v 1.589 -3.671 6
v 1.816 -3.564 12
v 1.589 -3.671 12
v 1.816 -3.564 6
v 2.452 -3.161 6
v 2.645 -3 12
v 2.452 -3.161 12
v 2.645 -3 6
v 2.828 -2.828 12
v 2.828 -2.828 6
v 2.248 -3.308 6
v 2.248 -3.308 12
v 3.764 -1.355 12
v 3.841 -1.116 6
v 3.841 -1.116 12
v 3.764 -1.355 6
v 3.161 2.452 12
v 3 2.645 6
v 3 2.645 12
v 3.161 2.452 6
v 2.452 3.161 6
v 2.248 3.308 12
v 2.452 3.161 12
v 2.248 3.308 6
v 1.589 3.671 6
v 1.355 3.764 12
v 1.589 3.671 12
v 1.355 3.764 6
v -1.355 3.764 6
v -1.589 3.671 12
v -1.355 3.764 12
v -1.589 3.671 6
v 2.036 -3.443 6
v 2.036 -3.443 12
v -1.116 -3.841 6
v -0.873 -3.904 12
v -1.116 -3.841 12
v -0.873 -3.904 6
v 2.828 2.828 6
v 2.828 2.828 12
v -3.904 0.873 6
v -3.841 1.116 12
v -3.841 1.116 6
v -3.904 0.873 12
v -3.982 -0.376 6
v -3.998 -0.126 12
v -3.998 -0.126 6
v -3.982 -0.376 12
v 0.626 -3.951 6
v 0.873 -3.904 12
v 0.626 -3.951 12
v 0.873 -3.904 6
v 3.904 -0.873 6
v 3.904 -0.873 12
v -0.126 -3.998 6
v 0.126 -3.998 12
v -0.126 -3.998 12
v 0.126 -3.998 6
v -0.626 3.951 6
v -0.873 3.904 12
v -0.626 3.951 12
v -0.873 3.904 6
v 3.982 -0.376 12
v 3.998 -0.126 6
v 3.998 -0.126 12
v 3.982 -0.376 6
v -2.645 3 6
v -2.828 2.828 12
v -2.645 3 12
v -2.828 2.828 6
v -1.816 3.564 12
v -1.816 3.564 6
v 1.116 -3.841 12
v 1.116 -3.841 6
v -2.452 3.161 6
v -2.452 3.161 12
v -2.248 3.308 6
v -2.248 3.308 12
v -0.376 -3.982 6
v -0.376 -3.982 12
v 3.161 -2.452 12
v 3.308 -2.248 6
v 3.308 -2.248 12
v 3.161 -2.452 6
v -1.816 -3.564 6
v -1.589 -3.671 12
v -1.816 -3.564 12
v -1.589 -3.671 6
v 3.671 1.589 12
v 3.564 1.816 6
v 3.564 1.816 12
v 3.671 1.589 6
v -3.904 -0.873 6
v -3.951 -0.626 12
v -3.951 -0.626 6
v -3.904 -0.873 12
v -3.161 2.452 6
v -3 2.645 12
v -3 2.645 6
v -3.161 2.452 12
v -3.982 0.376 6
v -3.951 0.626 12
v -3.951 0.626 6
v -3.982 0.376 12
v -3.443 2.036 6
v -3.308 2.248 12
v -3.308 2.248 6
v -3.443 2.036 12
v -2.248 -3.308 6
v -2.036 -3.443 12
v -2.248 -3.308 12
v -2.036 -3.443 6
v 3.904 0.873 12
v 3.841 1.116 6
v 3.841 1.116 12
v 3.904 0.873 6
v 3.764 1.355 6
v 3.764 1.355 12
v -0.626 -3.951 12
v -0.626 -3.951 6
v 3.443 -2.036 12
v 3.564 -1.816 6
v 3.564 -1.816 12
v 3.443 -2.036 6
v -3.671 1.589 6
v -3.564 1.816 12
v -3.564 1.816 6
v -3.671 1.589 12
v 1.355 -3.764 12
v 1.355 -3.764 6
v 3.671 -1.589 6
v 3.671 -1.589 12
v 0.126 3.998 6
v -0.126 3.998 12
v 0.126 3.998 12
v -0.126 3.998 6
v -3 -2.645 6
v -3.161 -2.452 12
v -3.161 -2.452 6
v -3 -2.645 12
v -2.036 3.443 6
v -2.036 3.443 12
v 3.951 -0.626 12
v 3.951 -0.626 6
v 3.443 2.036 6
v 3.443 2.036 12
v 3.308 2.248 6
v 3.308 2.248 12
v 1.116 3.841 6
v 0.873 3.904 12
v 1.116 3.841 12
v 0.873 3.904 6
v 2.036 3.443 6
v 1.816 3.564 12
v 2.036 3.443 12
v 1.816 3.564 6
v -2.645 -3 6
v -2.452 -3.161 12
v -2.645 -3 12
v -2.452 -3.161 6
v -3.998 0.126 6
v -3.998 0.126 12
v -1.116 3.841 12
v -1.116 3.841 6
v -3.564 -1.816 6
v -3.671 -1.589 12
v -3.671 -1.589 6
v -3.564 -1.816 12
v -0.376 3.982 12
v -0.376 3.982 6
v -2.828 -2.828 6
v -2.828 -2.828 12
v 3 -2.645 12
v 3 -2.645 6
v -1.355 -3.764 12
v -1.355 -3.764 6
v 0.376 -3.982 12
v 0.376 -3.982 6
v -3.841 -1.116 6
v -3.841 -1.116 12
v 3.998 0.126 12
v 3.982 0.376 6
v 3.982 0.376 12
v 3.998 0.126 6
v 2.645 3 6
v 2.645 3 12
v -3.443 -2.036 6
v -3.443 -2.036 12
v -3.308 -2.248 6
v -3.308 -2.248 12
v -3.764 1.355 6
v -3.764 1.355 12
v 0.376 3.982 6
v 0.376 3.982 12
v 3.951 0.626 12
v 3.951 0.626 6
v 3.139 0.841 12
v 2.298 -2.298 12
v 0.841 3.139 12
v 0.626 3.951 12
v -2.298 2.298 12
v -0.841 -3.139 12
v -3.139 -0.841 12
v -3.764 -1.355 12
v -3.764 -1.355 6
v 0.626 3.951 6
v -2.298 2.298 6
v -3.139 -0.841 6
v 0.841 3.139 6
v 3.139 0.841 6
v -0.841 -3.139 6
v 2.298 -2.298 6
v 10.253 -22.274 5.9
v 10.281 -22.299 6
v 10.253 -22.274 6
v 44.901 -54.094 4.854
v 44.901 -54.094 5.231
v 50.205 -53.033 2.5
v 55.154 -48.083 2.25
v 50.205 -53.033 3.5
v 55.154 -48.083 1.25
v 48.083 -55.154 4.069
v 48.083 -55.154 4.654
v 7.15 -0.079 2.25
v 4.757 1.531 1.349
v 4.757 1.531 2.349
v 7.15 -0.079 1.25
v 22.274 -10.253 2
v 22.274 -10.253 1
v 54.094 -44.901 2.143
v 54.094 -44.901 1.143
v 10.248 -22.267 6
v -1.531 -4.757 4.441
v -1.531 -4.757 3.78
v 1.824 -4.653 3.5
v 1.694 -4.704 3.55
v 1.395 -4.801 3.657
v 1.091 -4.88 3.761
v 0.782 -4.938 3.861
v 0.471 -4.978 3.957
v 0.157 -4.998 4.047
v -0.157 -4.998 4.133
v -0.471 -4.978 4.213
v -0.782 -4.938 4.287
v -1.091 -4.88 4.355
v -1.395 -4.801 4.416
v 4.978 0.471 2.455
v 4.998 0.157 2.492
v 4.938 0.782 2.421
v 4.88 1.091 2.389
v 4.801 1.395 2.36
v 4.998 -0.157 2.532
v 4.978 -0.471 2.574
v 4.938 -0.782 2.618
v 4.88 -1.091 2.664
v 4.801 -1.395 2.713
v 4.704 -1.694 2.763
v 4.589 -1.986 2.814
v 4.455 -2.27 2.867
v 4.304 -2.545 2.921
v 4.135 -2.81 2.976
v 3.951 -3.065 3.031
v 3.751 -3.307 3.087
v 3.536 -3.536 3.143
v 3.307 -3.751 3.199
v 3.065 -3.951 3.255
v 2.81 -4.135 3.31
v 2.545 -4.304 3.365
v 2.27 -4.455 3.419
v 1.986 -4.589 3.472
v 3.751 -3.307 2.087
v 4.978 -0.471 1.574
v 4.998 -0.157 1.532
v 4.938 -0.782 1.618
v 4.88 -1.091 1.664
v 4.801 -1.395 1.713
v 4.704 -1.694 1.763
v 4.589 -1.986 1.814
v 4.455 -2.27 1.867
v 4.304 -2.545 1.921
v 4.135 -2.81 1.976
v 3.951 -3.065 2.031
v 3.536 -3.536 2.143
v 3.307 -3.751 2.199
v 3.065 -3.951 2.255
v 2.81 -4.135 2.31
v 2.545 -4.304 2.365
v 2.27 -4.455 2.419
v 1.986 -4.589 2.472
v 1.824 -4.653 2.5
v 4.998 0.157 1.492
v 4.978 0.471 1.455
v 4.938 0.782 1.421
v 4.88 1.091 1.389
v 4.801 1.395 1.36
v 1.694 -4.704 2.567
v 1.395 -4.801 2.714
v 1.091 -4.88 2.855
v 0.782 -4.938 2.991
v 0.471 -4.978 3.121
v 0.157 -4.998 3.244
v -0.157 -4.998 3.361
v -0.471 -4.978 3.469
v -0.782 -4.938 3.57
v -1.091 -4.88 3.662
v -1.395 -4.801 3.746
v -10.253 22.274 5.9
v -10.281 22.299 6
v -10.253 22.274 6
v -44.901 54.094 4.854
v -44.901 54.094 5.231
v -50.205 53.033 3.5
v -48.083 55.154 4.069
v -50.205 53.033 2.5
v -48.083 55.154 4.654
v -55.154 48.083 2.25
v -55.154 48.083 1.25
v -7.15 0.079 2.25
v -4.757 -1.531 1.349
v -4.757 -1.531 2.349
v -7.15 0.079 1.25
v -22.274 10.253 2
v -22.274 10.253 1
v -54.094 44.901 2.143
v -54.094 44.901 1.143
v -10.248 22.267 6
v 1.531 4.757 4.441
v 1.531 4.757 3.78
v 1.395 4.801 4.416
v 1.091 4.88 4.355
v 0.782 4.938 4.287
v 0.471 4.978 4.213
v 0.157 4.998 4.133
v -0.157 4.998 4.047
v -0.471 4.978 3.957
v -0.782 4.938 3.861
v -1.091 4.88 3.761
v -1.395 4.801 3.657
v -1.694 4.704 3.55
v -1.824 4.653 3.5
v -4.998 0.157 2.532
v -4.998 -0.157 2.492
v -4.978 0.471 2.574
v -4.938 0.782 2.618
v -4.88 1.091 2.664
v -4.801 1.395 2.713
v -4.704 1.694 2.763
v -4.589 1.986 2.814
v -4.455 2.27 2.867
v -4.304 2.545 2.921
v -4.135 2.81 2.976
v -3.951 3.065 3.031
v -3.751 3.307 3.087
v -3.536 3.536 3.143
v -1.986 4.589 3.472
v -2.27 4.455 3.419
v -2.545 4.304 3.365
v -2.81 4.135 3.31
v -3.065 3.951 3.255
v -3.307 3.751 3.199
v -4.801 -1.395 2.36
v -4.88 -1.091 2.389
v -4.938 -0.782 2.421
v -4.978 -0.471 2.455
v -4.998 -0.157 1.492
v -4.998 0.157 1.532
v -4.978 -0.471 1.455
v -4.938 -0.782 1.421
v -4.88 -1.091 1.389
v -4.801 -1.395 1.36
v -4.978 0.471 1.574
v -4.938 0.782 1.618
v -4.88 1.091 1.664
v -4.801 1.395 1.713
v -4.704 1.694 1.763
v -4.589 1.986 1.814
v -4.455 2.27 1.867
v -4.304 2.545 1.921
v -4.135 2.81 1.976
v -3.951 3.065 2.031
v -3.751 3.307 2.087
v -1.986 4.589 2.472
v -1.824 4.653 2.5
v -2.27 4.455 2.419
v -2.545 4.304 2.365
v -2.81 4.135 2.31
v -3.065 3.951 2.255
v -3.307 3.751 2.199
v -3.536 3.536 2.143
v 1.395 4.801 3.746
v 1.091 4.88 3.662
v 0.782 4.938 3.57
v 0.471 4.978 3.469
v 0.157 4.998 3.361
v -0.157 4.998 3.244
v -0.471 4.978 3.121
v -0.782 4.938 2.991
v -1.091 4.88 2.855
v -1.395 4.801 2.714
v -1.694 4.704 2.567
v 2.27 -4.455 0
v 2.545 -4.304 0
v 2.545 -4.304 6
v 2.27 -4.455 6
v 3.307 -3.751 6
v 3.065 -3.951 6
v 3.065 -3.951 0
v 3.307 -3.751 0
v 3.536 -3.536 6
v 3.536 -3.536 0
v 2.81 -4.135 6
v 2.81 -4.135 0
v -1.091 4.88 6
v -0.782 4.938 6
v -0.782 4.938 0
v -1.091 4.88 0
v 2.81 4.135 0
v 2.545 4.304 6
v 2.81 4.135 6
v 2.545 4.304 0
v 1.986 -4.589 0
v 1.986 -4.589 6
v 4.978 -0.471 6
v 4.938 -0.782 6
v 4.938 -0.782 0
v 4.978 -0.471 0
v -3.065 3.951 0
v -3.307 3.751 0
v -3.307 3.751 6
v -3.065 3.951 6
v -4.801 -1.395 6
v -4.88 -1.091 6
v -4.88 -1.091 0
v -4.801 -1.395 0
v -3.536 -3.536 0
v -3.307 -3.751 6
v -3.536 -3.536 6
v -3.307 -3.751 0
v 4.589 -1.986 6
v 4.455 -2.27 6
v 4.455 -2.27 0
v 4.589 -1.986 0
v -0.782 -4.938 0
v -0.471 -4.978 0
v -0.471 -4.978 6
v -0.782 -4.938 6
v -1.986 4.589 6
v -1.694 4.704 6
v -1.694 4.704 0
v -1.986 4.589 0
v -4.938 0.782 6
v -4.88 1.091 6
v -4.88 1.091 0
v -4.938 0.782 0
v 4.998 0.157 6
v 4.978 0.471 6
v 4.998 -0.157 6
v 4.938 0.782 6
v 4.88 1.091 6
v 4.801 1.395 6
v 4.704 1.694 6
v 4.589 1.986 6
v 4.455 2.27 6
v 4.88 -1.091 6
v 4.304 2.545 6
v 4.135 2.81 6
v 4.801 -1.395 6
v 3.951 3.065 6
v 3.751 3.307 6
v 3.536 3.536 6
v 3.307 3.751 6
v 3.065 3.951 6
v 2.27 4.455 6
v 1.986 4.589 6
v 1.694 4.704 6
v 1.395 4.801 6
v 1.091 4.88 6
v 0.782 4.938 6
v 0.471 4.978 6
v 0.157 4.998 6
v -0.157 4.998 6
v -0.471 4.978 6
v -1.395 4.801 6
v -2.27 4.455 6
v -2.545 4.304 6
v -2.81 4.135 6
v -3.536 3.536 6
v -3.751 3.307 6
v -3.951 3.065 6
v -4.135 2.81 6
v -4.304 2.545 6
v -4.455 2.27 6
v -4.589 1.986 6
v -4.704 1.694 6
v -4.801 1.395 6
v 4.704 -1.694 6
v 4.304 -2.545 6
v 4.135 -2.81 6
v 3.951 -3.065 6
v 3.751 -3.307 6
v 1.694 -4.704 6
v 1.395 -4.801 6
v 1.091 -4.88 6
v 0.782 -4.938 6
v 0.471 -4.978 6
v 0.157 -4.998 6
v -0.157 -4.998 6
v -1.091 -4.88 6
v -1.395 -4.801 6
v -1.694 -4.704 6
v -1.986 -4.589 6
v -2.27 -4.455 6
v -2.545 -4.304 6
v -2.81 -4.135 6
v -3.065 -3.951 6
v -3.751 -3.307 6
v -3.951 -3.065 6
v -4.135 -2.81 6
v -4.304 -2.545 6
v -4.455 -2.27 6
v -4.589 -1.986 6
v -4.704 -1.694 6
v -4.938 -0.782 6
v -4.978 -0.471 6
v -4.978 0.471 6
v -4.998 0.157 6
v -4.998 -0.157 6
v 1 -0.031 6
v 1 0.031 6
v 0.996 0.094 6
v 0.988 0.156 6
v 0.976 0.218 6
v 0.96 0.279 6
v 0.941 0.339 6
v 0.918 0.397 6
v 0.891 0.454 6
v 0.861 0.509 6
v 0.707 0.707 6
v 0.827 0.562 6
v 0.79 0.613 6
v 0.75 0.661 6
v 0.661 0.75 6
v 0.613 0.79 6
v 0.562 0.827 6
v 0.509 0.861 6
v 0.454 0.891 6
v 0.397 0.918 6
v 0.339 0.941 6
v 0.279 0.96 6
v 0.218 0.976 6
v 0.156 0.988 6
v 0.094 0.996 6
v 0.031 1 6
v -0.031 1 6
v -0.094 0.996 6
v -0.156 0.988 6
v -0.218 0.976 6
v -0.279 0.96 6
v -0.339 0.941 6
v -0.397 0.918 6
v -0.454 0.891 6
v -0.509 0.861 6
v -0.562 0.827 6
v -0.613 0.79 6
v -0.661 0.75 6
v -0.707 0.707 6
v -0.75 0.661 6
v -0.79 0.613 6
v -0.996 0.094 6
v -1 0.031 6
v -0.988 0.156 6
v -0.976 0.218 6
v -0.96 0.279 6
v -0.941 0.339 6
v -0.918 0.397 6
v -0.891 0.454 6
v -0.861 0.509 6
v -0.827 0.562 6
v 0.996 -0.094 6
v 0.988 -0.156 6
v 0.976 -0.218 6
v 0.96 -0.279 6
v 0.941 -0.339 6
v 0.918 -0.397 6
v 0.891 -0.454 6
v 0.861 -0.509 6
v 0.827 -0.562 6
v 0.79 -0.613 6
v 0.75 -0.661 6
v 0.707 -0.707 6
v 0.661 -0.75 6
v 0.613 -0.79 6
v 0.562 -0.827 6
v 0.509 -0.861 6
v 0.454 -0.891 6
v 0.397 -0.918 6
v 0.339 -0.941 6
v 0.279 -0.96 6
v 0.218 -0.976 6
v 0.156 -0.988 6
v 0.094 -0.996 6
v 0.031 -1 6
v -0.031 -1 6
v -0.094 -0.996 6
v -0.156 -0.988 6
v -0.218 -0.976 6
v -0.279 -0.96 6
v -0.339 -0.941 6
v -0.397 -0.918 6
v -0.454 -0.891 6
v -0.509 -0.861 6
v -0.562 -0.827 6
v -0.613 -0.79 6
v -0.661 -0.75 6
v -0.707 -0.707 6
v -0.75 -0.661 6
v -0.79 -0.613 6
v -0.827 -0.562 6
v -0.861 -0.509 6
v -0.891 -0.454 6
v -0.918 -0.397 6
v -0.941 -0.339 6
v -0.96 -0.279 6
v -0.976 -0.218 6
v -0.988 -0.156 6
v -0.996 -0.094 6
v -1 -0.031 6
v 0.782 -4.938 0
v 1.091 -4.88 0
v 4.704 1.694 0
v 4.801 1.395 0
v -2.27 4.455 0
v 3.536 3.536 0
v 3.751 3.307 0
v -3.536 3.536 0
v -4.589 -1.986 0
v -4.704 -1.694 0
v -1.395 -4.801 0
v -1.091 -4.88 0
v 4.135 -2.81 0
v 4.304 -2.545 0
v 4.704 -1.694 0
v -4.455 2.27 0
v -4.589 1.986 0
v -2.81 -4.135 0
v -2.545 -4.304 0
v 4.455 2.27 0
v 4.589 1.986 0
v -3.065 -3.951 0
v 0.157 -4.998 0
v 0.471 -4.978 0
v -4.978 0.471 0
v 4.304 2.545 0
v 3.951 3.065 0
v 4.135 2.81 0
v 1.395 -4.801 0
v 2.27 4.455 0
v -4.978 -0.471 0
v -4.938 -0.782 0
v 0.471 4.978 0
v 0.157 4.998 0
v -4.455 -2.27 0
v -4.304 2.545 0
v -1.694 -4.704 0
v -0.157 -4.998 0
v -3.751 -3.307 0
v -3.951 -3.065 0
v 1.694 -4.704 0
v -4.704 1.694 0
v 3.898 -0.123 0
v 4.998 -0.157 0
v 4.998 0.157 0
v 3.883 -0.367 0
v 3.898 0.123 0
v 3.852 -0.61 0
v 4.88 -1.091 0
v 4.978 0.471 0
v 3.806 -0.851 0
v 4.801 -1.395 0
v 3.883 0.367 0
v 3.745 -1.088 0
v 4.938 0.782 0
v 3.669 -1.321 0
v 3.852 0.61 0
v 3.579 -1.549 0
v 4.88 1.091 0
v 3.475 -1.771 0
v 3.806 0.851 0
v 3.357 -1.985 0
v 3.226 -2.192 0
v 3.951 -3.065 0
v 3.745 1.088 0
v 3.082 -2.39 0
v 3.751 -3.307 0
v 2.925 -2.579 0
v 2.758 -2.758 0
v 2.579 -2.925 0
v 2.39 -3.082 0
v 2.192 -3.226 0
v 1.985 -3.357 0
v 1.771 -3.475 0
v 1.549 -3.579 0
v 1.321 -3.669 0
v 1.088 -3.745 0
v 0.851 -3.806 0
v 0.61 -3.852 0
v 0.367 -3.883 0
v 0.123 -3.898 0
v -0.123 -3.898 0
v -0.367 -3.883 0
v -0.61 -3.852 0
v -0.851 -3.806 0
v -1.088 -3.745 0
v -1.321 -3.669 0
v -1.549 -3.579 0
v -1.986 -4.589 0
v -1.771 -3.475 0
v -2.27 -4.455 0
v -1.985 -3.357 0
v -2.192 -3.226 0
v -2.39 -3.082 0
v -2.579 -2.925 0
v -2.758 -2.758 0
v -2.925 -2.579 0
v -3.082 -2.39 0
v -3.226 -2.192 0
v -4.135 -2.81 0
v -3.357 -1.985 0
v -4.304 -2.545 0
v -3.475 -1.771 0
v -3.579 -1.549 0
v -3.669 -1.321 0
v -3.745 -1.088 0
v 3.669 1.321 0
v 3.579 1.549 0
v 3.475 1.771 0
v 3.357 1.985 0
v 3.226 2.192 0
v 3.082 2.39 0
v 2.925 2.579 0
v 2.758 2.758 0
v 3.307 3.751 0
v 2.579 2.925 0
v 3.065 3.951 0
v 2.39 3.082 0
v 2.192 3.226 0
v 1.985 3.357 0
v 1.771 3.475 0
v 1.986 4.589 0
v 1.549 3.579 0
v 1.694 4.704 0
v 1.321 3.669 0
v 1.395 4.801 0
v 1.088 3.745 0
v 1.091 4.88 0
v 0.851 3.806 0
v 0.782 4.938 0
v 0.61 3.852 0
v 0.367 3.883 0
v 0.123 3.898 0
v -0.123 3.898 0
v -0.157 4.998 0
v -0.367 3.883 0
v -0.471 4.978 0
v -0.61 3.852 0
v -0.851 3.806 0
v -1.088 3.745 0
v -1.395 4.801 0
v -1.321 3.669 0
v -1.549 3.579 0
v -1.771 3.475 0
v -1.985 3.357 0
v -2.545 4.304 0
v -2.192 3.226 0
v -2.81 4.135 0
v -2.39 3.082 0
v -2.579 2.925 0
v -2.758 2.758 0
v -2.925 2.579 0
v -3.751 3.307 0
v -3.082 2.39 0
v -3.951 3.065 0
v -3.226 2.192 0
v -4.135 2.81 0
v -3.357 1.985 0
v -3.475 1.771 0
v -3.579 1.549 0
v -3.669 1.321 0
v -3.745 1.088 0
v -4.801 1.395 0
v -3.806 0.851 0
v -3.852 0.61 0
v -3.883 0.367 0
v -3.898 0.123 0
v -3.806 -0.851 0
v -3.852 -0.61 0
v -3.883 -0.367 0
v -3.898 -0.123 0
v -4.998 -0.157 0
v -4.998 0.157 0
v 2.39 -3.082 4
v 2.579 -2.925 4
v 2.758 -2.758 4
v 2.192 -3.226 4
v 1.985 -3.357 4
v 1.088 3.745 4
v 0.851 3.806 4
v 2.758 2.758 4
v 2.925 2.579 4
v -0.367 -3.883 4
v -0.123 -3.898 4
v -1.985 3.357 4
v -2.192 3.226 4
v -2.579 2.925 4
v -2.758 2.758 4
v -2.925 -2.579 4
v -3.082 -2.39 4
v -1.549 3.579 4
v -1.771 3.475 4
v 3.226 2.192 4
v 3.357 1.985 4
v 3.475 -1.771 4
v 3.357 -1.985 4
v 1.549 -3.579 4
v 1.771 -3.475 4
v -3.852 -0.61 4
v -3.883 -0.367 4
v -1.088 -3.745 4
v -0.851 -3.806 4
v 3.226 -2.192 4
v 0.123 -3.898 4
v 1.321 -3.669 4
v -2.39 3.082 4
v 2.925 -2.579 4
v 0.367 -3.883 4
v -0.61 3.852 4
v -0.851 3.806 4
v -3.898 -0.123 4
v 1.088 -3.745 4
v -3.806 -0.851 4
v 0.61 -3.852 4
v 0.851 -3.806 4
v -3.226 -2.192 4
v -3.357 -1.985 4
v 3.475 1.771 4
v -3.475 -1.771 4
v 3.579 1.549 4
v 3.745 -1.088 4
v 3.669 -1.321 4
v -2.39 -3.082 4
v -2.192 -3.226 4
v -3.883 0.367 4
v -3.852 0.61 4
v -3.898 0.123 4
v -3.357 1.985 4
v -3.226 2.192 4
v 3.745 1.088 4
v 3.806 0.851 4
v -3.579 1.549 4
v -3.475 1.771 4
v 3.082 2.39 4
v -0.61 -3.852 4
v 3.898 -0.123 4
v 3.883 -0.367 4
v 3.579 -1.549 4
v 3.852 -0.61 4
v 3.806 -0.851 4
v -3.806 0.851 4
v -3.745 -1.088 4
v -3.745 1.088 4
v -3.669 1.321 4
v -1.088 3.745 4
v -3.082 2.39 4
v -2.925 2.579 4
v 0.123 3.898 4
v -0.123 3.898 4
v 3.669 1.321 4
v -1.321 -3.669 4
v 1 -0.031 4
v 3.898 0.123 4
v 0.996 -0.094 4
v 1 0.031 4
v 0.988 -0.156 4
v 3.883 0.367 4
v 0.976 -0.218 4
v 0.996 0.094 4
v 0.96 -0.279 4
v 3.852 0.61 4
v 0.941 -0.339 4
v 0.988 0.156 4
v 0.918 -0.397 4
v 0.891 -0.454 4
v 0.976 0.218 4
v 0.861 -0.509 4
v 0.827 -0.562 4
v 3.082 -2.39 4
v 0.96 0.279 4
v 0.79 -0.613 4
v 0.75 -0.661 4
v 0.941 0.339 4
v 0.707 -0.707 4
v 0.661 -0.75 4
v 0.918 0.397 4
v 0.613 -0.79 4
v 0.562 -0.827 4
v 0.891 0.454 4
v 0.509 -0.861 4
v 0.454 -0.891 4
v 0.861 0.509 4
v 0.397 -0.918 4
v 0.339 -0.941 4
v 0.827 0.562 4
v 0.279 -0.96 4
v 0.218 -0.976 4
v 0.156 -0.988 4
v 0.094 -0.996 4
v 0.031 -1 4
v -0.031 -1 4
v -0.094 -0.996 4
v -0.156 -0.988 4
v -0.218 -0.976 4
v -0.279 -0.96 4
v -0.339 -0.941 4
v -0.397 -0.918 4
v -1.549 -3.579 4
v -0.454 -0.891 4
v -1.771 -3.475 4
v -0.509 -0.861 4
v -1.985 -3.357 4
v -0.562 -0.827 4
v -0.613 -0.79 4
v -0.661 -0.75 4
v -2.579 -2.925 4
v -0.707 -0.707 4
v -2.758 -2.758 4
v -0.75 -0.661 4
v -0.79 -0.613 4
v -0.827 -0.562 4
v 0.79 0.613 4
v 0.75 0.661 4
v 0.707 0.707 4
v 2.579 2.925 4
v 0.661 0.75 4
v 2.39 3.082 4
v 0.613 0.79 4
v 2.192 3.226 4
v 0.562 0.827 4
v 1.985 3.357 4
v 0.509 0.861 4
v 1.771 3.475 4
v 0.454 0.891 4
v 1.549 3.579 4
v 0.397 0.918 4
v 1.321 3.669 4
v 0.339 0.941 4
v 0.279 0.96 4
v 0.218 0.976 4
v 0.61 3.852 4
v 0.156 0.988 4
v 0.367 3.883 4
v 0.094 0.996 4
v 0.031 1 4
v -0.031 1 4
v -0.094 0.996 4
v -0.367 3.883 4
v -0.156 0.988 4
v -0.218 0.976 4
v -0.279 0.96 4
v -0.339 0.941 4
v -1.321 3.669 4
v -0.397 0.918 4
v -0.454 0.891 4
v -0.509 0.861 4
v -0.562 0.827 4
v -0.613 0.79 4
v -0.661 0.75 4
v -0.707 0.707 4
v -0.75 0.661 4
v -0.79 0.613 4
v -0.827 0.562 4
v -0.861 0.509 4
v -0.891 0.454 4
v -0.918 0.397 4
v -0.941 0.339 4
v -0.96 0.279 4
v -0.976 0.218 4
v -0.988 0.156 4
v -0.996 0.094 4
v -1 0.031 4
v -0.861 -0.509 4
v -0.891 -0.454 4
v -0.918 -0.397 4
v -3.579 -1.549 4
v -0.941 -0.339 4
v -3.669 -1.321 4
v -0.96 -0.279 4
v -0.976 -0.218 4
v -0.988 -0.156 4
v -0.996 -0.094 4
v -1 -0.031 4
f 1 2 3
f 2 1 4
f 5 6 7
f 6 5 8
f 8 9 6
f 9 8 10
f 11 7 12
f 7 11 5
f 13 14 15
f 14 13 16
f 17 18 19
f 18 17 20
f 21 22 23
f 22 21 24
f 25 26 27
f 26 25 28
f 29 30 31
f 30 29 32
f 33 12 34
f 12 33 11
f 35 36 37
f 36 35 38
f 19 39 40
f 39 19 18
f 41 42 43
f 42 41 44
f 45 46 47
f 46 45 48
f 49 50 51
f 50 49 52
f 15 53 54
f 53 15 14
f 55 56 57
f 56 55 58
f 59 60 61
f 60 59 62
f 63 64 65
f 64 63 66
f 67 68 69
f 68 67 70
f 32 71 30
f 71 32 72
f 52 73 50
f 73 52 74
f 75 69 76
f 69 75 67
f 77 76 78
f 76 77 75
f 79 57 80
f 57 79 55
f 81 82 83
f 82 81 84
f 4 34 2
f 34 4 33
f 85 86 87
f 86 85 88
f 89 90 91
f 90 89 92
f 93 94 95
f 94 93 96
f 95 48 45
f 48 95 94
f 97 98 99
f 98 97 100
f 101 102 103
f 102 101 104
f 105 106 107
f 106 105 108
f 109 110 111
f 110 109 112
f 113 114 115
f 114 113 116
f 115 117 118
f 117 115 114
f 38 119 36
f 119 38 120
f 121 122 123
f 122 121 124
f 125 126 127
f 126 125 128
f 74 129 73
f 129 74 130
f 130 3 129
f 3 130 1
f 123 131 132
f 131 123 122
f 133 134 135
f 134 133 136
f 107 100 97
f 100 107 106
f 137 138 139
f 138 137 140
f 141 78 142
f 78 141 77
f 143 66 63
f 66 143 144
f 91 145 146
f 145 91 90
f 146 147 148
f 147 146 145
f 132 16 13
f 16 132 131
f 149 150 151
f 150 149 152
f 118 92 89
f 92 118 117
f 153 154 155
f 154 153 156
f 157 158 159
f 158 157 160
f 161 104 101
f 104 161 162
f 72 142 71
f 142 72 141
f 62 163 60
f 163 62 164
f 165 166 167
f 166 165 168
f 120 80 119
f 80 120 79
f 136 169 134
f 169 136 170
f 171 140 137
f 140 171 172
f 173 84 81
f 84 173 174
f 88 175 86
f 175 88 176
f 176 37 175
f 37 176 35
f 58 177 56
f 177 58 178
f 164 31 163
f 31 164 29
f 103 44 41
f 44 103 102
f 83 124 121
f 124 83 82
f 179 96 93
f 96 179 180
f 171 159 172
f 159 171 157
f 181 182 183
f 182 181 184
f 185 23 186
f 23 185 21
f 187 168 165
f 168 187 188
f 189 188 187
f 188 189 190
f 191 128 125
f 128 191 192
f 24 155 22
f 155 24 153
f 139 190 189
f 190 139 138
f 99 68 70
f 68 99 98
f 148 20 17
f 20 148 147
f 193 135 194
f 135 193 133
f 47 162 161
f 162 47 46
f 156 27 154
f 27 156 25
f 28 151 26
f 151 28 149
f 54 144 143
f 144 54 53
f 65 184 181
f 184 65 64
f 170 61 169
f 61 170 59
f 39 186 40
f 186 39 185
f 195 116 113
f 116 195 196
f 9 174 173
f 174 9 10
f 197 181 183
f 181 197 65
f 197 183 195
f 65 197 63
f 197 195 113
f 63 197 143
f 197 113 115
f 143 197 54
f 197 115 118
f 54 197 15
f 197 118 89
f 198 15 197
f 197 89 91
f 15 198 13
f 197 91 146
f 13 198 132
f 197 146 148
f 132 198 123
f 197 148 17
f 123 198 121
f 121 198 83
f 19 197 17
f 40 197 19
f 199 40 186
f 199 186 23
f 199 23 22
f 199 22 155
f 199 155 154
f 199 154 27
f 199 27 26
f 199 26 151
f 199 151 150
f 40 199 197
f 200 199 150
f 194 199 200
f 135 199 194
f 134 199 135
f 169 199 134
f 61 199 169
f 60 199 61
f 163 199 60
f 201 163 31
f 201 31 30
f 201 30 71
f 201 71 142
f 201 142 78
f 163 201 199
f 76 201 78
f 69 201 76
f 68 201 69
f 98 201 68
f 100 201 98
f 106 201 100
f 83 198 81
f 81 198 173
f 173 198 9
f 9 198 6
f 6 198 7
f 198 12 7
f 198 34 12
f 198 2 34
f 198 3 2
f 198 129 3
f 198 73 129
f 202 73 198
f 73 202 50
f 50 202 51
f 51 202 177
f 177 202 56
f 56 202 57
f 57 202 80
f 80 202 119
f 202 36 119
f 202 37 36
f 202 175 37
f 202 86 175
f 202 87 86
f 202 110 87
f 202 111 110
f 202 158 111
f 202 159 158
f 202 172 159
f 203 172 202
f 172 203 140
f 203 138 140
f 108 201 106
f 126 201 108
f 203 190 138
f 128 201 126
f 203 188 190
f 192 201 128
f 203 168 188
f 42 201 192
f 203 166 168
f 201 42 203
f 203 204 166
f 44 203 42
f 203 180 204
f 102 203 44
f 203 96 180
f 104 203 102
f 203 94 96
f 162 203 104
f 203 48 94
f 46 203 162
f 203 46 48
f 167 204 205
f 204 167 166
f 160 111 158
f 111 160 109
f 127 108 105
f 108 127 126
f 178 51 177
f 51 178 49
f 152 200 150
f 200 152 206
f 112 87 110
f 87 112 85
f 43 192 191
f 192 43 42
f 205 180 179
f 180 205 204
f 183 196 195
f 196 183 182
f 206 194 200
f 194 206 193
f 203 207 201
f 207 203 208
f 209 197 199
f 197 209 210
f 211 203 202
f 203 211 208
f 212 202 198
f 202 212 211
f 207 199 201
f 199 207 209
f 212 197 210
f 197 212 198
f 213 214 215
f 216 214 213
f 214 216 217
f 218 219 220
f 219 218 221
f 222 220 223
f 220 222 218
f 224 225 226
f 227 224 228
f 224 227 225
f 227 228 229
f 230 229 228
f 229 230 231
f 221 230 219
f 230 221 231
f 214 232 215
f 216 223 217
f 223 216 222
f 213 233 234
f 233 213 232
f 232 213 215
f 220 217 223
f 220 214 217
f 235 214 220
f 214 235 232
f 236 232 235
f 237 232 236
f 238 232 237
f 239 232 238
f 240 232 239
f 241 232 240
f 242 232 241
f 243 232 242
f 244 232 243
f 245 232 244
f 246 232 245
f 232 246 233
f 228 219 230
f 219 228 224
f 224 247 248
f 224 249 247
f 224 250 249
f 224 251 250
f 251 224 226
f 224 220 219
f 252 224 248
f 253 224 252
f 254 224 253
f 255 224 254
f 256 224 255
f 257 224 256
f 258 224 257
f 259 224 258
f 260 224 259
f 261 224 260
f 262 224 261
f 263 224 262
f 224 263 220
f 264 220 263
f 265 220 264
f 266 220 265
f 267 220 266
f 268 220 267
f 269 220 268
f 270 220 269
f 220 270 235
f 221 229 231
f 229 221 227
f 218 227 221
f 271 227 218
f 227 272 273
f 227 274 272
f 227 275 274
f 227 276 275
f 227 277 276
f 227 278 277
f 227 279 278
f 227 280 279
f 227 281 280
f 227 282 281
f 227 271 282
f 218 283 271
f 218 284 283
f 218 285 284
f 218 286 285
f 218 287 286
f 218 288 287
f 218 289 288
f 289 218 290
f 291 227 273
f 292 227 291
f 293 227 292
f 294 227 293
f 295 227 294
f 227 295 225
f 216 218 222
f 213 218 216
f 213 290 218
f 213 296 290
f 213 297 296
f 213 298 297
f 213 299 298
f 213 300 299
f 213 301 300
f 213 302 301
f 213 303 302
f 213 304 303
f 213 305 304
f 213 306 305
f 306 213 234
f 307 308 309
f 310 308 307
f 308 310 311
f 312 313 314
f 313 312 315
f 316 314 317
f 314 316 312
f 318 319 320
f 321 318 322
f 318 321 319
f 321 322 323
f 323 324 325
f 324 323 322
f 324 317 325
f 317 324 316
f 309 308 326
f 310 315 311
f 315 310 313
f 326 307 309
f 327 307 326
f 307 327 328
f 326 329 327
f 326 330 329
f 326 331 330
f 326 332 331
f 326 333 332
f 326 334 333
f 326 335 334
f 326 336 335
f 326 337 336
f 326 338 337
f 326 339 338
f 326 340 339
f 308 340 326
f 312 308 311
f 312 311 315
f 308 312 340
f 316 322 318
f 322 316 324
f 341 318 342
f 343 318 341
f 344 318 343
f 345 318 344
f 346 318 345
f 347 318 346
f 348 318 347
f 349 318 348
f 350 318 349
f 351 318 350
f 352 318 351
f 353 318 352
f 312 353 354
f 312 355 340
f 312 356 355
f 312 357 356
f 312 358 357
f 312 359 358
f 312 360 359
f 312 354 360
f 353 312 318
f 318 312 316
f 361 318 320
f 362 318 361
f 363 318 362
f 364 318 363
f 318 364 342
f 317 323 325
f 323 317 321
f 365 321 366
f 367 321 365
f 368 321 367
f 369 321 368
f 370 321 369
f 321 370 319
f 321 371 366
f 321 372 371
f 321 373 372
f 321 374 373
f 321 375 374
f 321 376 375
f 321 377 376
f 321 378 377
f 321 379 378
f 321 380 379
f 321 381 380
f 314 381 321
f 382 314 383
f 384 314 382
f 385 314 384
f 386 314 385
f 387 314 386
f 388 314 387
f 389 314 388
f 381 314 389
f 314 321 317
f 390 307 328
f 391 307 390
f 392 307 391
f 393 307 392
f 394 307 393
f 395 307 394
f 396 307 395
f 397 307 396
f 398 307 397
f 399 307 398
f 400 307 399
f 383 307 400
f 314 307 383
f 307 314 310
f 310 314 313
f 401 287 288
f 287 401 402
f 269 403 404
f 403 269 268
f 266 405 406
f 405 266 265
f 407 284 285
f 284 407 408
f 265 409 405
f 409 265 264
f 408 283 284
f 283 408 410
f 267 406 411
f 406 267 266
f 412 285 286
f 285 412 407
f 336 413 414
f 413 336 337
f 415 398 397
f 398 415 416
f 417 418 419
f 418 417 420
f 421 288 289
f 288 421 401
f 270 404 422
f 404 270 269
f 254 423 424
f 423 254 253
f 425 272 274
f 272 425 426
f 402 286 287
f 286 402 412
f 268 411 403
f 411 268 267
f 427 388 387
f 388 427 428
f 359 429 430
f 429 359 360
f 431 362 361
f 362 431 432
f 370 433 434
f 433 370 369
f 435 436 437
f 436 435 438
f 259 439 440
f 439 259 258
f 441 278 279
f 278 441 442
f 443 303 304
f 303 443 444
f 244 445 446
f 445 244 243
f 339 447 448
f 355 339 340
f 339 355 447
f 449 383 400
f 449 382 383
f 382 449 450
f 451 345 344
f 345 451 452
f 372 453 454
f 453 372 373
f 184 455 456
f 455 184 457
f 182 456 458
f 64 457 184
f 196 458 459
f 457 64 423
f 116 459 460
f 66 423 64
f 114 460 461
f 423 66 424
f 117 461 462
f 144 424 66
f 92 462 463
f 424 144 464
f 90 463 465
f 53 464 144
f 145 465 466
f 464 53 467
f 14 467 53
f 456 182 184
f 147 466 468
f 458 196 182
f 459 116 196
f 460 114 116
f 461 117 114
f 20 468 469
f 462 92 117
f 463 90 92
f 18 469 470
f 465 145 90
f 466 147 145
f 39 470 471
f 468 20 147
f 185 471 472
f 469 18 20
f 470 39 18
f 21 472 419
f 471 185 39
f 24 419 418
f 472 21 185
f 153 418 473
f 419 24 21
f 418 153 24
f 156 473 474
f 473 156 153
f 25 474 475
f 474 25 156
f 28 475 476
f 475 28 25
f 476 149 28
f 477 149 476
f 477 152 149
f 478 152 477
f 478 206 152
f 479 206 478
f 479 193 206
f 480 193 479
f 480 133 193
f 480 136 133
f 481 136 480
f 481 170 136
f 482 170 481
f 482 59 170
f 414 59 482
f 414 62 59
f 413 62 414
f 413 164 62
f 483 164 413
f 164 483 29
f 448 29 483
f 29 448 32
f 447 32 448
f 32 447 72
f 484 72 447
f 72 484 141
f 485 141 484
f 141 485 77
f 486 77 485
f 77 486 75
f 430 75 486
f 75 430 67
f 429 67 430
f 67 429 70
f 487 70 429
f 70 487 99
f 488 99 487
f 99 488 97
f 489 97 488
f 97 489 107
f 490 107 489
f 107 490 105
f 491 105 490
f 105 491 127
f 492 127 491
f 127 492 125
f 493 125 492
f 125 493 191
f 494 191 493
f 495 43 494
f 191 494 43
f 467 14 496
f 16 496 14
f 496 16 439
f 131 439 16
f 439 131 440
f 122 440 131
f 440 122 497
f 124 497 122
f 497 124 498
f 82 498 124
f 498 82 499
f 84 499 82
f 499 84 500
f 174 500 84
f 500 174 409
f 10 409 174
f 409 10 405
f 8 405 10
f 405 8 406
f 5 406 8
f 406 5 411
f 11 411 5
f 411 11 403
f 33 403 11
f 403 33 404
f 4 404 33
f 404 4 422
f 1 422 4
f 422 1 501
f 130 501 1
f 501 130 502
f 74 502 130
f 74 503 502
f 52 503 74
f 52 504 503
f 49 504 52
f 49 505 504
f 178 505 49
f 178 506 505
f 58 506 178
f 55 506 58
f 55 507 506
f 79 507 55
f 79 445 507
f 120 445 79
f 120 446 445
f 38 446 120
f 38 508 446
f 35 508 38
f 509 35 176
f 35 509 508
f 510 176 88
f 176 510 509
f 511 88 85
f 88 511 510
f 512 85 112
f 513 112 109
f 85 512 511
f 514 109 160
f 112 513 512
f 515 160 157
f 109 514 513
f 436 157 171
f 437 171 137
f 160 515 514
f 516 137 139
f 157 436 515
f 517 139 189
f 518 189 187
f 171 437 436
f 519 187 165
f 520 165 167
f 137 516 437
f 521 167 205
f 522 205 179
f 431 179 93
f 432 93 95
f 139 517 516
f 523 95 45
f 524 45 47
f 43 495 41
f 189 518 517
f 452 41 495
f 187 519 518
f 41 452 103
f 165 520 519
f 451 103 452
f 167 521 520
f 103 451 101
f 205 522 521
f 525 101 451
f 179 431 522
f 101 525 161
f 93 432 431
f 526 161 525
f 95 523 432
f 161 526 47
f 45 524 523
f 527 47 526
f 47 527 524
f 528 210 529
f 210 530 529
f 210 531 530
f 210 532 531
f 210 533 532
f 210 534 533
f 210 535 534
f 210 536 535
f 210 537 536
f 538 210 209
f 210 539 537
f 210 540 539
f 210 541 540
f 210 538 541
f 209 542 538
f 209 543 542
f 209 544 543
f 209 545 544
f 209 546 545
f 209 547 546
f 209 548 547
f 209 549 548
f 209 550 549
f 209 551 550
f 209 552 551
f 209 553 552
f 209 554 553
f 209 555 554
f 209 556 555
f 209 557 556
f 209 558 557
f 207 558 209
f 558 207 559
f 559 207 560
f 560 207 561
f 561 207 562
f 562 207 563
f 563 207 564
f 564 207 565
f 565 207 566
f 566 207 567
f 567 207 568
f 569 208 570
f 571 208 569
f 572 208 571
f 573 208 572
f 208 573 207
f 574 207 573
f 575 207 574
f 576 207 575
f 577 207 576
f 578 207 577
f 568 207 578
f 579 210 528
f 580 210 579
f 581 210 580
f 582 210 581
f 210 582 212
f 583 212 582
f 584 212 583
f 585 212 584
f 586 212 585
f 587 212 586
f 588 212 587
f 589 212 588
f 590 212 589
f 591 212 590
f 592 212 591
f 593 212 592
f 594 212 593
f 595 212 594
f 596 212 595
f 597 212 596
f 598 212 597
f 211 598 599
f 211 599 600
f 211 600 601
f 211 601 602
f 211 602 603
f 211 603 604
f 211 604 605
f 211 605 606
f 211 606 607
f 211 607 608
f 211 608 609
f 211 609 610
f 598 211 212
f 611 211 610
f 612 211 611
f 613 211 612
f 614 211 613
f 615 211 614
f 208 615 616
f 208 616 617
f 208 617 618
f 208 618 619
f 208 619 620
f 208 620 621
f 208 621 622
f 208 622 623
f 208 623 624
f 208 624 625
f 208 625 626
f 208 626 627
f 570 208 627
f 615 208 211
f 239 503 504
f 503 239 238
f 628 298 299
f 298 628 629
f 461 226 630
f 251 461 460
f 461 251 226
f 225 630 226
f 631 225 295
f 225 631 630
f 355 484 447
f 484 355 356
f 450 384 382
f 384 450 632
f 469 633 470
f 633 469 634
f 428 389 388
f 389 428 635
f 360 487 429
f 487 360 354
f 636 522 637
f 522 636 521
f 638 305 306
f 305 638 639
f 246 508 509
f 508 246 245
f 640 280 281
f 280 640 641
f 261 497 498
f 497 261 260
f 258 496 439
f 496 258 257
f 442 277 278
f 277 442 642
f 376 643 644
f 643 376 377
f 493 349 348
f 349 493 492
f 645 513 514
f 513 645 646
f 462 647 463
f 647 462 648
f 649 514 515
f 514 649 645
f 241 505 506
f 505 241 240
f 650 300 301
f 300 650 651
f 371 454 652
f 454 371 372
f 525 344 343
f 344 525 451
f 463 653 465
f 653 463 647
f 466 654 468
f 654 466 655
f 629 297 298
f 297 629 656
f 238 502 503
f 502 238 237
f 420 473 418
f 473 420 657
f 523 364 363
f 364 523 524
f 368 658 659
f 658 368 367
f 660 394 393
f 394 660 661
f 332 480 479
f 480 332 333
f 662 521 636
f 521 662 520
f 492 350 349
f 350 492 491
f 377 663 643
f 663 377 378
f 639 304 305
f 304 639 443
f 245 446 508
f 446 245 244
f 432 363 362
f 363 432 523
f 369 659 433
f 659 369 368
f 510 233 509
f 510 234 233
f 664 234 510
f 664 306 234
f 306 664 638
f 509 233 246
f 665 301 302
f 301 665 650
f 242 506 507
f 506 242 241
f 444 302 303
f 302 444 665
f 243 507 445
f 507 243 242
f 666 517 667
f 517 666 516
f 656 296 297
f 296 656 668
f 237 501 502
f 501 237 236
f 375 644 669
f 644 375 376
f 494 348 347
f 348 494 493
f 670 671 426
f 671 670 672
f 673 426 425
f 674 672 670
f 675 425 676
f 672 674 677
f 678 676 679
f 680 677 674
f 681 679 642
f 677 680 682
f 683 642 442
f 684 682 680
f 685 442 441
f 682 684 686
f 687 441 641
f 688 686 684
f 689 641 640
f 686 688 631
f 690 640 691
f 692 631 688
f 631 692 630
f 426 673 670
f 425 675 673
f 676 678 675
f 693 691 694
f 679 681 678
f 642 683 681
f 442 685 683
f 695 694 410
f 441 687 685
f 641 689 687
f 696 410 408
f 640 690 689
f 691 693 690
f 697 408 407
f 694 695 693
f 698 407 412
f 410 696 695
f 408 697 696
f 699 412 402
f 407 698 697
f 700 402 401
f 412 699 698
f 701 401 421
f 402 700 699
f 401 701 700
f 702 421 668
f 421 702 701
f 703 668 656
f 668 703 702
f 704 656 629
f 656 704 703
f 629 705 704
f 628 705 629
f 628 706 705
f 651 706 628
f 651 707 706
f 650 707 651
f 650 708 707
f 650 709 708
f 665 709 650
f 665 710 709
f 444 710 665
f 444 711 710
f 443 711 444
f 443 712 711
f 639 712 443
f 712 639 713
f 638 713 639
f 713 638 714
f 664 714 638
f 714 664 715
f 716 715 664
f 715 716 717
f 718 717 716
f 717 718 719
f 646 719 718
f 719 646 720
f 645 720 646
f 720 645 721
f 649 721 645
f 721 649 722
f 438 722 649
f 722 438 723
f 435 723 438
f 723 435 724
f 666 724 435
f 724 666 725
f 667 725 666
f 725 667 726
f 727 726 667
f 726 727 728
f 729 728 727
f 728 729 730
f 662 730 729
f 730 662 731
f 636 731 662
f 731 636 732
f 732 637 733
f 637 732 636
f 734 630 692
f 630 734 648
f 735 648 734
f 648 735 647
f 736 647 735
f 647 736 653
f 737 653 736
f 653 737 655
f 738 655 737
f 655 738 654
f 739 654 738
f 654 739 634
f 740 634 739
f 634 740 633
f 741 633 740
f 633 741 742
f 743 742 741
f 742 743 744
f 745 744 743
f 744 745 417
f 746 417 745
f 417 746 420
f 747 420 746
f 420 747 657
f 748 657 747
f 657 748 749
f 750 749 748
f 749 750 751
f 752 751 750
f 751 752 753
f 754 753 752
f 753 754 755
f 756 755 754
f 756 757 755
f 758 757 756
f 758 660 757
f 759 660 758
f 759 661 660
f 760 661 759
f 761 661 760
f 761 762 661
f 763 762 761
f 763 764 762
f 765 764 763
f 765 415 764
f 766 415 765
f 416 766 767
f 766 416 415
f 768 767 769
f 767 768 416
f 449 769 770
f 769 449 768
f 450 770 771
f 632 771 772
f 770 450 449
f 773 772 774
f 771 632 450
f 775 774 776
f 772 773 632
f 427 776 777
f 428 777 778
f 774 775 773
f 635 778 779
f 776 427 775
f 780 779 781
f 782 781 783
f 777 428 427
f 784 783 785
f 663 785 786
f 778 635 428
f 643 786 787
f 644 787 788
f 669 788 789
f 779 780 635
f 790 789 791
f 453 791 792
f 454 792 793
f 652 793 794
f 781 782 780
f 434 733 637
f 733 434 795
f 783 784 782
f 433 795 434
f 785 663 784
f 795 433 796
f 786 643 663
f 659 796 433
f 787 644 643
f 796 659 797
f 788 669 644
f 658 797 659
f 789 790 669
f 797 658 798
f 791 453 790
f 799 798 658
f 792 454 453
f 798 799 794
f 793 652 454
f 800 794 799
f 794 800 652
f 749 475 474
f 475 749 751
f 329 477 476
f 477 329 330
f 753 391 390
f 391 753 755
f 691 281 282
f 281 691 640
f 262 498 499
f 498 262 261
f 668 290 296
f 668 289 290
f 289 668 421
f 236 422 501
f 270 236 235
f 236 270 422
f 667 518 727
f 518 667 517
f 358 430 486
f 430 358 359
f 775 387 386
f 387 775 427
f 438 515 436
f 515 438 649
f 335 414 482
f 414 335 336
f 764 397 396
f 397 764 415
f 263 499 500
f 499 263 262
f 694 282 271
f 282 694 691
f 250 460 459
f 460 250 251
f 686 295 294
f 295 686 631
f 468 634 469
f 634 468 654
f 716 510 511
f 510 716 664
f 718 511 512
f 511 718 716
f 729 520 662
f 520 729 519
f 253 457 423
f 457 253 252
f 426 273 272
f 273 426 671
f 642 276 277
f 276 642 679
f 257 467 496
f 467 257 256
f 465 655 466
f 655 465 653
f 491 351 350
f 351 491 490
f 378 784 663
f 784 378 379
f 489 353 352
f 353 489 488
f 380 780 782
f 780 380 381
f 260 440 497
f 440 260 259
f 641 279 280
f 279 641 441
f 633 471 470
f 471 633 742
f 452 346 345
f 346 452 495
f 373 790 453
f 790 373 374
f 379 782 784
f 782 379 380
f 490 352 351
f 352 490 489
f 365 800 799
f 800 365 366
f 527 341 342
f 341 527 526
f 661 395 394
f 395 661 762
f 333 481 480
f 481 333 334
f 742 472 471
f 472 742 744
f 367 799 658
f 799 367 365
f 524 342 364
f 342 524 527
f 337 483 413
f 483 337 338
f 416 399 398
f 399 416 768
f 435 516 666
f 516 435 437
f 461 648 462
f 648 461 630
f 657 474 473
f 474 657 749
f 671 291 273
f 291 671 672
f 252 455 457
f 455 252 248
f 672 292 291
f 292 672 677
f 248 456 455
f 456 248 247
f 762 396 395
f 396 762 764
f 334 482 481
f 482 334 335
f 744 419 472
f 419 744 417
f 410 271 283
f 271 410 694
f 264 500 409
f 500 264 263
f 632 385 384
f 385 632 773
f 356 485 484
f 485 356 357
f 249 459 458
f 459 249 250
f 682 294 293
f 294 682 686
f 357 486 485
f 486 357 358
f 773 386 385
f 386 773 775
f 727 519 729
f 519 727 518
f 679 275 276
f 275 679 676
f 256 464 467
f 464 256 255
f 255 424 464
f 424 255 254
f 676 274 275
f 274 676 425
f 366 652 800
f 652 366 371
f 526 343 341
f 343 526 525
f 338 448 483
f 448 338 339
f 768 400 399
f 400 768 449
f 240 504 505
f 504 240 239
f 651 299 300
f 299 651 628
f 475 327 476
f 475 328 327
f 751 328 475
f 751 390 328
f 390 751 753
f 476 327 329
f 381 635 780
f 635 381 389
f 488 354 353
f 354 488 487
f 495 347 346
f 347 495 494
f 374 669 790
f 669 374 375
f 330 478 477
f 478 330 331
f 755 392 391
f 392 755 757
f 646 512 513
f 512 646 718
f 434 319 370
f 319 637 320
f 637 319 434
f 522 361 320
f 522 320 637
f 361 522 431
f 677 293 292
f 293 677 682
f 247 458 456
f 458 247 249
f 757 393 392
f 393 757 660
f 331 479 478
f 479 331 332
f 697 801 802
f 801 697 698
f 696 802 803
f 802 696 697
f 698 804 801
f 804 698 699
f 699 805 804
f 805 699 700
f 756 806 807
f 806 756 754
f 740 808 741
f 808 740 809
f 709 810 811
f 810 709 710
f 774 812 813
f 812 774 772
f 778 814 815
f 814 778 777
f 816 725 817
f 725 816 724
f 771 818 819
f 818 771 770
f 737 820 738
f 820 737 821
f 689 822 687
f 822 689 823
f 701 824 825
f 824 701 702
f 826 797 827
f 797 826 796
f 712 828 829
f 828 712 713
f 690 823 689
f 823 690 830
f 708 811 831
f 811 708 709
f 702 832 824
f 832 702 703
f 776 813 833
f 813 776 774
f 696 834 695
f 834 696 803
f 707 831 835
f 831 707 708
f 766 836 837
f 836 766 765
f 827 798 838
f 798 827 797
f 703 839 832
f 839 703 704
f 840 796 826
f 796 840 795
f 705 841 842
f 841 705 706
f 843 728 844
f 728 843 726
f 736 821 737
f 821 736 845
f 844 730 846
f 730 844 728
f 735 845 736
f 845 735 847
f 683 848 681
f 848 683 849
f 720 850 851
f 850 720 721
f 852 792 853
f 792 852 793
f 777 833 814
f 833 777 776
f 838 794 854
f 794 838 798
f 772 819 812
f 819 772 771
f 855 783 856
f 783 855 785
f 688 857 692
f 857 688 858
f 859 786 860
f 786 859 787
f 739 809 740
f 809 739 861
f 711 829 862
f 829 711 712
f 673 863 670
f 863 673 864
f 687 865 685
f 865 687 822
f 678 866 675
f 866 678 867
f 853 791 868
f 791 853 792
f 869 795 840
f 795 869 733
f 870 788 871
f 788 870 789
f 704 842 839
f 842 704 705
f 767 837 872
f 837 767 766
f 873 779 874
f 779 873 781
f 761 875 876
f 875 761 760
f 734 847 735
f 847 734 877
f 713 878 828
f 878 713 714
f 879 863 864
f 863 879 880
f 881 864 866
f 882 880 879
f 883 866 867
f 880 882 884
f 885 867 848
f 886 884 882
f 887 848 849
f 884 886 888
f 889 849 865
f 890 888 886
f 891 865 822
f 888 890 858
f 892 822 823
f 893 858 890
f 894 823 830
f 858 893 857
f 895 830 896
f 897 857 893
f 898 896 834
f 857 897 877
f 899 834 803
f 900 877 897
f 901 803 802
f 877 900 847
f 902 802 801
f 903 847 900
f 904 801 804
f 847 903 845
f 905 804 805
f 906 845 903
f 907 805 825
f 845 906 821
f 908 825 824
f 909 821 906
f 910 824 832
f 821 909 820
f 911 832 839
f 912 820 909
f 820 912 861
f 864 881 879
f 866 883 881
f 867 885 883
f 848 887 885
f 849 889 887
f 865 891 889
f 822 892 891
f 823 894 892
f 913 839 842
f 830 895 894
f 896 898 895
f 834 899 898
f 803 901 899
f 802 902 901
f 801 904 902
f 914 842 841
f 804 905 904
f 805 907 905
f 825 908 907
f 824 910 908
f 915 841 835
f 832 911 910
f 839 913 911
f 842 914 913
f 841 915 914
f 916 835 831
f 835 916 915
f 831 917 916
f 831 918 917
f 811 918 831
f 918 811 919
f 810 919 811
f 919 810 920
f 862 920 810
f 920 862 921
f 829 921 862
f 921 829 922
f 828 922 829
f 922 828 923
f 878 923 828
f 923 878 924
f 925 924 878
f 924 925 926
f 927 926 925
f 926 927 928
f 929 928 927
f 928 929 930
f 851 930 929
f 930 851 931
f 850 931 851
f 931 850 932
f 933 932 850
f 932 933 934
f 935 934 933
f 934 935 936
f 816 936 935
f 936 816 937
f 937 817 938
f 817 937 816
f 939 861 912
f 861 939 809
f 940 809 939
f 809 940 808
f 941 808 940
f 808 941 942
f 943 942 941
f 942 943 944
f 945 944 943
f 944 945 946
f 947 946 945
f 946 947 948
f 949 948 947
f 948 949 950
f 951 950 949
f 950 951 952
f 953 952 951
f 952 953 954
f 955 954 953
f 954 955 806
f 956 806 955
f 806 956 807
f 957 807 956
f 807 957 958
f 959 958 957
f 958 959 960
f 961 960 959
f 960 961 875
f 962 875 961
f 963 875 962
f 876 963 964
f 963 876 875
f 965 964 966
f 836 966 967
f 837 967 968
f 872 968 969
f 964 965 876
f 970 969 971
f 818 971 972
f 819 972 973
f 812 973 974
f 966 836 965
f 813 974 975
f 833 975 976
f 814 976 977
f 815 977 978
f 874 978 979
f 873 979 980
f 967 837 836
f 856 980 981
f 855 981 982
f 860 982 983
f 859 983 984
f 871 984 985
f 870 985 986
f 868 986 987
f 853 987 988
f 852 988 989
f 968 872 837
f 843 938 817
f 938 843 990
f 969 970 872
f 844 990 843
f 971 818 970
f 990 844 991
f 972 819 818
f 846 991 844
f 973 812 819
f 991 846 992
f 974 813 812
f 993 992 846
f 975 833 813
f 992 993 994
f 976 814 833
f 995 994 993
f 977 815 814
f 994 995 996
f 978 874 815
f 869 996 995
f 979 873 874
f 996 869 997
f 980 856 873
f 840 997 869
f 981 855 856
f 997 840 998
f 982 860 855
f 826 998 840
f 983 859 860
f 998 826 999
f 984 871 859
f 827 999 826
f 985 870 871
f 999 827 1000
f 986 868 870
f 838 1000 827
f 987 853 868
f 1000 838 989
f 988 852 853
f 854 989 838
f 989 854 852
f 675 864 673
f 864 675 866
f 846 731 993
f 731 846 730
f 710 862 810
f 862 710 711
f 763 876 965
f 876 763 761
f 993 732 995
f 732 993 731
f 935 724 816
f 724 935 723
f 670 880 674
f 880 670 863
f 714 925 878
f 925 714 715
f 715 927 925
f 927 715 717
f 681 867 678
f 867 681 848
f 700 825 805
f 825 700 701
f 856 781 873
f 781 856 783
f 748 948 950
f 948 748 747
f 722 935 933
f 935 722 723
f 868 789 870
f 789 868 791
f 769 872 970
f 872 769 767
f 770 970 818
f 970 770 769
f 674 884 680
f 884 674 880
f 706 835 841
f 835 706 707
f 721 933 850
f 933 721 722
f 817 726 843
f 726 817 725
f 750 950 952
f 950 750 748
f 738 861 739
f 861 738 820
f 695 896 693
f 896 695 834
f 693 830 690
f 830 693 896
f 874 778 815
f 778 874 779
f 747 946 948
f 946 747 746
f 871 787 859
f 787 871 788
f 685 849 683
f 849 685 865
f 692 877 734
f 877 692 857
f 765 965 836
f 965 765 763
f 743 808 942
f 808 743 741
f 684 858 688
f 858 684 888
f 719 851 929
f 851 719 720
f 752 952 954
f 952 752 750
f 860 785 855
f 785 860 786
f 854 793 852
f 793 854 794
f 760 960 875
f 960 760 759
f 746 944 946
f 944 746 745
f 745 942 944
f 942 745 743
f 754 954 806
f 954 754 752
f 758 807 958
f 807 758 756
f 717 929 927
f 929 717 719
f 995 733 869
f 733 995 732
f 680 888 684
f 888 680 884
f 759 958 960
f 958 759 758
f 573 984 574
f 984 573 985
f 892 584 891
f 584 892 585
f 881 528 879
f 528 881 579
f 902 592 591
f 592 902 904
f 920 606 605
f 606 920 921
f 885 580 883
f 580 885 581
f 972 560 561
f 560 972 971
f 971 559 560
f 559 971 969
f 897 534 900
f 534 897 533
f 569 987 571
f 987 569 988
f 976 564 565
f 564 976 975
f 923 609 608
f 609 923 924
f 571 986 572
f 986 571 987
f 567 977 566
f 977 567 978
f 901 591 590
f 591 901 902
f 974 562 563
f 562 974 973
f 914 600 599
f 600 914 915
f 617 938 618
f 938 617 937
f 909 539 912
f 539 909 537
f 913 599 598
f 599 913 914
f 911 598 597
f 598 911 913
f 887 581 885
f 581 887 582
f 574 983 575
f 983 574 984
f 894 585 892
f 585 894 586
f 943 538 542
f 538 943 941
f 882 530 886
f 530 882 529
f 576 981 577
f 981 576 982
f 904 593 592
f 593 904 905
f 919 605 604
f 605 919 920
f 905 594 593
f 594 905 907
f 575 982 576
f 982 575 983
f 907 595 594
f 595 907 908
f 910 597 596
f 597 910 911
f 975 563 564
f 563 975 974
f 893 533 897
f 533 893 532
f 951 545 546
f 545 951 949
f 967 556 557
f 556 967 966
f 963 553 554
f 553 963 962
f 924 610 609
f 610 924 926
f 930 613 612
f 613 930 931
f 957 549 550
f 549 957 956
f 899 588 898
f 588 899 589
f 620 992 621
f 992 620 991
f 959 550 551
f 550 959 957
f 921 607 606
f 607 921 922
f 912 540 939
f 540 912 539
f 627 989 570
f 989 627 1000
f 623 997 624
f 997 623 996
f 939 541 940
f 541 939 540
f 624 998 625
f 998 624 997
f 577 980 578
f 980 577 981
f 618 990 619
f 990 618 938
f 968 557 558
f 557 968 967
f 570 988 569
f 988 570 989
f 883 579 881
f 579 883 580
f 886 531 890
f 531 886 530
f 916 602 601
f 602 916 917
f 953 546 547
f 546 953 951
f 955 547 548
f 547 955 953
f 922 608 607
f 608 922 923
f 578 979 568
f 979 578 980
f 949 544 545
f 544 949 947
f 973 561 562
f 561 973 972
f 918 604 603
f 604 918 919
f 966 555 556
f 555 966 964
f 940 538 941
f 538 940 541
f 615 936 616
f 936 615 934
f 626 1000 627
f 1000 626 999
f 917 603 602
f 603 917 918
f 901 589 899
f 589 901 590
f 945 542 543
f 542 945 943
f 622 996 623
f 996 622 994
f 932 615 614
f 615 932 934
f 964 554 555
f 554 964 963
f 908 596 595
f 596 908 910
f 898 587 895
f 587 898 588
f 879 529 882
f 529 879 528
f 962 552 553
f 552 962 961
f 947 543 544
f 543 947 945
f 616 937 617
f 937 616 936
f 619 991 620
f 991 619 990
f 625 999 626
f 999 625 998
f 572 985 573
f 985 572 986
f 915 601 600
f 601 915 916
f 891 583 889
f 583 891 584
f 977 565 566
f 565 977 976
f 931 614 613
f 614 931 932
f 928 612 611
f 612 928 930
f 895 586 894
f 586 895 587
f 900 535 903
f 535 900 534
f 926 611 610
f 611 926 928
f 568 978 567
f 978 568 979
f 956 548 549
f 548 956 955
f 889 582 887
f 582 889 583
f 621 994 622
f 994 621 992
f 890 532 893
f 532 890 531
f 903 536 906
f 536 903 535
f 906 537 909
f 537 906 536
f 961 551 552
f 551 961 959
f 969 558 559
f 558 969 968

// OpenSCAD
function ngon(count, radius, i = 0, result = []) = i < count
    ? ngon(count, radius, i + 1, concat(result, [[ radius*sin(360/count*i), radius*cos(360/count*i) ]]))
    : result;
    
    
module blade(){
difference(){
linear_extrude(5,convexity=10)
polygon([[0,-4],[23,-8.5],[70,-6.5],[73,-5],[73,5],[70,6.5],[23,8.5],[0,4],[0,-4]]);

rotate([90,0,90])
linear_extrude(73.002,convexity=10)
polygon([[-8.501,4],[-5,3.75],[2,2.5],[8.501,-0.001],[-8.501,-0.001],[-8.501,4]]);

rotate([90,0,90])
linear_extrude(73.002,convexity=10)
polygon([[-8.501,5],[-5,4.75],[2,3.5],[8.501,0.1-0.001],[8.501,6],[-8.501,6]]);
    }
    
}

module propeller(){
        
    translate([0,0,6]){
        difference(){
            union(){
                translate([0,0,-6])
                difference(){
                    cylinder(6.001,4,4,$fn=100);
                    
                    translate([0,0,-0.001])
                    linear_extrude(7.501,convexity=10)
                    rotate([0,0,30])
                    polygon(ngon(6,6.5/2));
                }
                cylinder(6,5,5,$fn=100);
                blade();
                rotate([0,0,180])
                blade();
            }
            translate([0,0,2])
            cylinder(4.002,3.9,3.9,$fn=100);
            
            translate([0,0,-6])
            cylinder(12,1,1,$fn=100);
        }
    }
}

translate([0,0,12])
rotate([180,0,-45])
propeller();
